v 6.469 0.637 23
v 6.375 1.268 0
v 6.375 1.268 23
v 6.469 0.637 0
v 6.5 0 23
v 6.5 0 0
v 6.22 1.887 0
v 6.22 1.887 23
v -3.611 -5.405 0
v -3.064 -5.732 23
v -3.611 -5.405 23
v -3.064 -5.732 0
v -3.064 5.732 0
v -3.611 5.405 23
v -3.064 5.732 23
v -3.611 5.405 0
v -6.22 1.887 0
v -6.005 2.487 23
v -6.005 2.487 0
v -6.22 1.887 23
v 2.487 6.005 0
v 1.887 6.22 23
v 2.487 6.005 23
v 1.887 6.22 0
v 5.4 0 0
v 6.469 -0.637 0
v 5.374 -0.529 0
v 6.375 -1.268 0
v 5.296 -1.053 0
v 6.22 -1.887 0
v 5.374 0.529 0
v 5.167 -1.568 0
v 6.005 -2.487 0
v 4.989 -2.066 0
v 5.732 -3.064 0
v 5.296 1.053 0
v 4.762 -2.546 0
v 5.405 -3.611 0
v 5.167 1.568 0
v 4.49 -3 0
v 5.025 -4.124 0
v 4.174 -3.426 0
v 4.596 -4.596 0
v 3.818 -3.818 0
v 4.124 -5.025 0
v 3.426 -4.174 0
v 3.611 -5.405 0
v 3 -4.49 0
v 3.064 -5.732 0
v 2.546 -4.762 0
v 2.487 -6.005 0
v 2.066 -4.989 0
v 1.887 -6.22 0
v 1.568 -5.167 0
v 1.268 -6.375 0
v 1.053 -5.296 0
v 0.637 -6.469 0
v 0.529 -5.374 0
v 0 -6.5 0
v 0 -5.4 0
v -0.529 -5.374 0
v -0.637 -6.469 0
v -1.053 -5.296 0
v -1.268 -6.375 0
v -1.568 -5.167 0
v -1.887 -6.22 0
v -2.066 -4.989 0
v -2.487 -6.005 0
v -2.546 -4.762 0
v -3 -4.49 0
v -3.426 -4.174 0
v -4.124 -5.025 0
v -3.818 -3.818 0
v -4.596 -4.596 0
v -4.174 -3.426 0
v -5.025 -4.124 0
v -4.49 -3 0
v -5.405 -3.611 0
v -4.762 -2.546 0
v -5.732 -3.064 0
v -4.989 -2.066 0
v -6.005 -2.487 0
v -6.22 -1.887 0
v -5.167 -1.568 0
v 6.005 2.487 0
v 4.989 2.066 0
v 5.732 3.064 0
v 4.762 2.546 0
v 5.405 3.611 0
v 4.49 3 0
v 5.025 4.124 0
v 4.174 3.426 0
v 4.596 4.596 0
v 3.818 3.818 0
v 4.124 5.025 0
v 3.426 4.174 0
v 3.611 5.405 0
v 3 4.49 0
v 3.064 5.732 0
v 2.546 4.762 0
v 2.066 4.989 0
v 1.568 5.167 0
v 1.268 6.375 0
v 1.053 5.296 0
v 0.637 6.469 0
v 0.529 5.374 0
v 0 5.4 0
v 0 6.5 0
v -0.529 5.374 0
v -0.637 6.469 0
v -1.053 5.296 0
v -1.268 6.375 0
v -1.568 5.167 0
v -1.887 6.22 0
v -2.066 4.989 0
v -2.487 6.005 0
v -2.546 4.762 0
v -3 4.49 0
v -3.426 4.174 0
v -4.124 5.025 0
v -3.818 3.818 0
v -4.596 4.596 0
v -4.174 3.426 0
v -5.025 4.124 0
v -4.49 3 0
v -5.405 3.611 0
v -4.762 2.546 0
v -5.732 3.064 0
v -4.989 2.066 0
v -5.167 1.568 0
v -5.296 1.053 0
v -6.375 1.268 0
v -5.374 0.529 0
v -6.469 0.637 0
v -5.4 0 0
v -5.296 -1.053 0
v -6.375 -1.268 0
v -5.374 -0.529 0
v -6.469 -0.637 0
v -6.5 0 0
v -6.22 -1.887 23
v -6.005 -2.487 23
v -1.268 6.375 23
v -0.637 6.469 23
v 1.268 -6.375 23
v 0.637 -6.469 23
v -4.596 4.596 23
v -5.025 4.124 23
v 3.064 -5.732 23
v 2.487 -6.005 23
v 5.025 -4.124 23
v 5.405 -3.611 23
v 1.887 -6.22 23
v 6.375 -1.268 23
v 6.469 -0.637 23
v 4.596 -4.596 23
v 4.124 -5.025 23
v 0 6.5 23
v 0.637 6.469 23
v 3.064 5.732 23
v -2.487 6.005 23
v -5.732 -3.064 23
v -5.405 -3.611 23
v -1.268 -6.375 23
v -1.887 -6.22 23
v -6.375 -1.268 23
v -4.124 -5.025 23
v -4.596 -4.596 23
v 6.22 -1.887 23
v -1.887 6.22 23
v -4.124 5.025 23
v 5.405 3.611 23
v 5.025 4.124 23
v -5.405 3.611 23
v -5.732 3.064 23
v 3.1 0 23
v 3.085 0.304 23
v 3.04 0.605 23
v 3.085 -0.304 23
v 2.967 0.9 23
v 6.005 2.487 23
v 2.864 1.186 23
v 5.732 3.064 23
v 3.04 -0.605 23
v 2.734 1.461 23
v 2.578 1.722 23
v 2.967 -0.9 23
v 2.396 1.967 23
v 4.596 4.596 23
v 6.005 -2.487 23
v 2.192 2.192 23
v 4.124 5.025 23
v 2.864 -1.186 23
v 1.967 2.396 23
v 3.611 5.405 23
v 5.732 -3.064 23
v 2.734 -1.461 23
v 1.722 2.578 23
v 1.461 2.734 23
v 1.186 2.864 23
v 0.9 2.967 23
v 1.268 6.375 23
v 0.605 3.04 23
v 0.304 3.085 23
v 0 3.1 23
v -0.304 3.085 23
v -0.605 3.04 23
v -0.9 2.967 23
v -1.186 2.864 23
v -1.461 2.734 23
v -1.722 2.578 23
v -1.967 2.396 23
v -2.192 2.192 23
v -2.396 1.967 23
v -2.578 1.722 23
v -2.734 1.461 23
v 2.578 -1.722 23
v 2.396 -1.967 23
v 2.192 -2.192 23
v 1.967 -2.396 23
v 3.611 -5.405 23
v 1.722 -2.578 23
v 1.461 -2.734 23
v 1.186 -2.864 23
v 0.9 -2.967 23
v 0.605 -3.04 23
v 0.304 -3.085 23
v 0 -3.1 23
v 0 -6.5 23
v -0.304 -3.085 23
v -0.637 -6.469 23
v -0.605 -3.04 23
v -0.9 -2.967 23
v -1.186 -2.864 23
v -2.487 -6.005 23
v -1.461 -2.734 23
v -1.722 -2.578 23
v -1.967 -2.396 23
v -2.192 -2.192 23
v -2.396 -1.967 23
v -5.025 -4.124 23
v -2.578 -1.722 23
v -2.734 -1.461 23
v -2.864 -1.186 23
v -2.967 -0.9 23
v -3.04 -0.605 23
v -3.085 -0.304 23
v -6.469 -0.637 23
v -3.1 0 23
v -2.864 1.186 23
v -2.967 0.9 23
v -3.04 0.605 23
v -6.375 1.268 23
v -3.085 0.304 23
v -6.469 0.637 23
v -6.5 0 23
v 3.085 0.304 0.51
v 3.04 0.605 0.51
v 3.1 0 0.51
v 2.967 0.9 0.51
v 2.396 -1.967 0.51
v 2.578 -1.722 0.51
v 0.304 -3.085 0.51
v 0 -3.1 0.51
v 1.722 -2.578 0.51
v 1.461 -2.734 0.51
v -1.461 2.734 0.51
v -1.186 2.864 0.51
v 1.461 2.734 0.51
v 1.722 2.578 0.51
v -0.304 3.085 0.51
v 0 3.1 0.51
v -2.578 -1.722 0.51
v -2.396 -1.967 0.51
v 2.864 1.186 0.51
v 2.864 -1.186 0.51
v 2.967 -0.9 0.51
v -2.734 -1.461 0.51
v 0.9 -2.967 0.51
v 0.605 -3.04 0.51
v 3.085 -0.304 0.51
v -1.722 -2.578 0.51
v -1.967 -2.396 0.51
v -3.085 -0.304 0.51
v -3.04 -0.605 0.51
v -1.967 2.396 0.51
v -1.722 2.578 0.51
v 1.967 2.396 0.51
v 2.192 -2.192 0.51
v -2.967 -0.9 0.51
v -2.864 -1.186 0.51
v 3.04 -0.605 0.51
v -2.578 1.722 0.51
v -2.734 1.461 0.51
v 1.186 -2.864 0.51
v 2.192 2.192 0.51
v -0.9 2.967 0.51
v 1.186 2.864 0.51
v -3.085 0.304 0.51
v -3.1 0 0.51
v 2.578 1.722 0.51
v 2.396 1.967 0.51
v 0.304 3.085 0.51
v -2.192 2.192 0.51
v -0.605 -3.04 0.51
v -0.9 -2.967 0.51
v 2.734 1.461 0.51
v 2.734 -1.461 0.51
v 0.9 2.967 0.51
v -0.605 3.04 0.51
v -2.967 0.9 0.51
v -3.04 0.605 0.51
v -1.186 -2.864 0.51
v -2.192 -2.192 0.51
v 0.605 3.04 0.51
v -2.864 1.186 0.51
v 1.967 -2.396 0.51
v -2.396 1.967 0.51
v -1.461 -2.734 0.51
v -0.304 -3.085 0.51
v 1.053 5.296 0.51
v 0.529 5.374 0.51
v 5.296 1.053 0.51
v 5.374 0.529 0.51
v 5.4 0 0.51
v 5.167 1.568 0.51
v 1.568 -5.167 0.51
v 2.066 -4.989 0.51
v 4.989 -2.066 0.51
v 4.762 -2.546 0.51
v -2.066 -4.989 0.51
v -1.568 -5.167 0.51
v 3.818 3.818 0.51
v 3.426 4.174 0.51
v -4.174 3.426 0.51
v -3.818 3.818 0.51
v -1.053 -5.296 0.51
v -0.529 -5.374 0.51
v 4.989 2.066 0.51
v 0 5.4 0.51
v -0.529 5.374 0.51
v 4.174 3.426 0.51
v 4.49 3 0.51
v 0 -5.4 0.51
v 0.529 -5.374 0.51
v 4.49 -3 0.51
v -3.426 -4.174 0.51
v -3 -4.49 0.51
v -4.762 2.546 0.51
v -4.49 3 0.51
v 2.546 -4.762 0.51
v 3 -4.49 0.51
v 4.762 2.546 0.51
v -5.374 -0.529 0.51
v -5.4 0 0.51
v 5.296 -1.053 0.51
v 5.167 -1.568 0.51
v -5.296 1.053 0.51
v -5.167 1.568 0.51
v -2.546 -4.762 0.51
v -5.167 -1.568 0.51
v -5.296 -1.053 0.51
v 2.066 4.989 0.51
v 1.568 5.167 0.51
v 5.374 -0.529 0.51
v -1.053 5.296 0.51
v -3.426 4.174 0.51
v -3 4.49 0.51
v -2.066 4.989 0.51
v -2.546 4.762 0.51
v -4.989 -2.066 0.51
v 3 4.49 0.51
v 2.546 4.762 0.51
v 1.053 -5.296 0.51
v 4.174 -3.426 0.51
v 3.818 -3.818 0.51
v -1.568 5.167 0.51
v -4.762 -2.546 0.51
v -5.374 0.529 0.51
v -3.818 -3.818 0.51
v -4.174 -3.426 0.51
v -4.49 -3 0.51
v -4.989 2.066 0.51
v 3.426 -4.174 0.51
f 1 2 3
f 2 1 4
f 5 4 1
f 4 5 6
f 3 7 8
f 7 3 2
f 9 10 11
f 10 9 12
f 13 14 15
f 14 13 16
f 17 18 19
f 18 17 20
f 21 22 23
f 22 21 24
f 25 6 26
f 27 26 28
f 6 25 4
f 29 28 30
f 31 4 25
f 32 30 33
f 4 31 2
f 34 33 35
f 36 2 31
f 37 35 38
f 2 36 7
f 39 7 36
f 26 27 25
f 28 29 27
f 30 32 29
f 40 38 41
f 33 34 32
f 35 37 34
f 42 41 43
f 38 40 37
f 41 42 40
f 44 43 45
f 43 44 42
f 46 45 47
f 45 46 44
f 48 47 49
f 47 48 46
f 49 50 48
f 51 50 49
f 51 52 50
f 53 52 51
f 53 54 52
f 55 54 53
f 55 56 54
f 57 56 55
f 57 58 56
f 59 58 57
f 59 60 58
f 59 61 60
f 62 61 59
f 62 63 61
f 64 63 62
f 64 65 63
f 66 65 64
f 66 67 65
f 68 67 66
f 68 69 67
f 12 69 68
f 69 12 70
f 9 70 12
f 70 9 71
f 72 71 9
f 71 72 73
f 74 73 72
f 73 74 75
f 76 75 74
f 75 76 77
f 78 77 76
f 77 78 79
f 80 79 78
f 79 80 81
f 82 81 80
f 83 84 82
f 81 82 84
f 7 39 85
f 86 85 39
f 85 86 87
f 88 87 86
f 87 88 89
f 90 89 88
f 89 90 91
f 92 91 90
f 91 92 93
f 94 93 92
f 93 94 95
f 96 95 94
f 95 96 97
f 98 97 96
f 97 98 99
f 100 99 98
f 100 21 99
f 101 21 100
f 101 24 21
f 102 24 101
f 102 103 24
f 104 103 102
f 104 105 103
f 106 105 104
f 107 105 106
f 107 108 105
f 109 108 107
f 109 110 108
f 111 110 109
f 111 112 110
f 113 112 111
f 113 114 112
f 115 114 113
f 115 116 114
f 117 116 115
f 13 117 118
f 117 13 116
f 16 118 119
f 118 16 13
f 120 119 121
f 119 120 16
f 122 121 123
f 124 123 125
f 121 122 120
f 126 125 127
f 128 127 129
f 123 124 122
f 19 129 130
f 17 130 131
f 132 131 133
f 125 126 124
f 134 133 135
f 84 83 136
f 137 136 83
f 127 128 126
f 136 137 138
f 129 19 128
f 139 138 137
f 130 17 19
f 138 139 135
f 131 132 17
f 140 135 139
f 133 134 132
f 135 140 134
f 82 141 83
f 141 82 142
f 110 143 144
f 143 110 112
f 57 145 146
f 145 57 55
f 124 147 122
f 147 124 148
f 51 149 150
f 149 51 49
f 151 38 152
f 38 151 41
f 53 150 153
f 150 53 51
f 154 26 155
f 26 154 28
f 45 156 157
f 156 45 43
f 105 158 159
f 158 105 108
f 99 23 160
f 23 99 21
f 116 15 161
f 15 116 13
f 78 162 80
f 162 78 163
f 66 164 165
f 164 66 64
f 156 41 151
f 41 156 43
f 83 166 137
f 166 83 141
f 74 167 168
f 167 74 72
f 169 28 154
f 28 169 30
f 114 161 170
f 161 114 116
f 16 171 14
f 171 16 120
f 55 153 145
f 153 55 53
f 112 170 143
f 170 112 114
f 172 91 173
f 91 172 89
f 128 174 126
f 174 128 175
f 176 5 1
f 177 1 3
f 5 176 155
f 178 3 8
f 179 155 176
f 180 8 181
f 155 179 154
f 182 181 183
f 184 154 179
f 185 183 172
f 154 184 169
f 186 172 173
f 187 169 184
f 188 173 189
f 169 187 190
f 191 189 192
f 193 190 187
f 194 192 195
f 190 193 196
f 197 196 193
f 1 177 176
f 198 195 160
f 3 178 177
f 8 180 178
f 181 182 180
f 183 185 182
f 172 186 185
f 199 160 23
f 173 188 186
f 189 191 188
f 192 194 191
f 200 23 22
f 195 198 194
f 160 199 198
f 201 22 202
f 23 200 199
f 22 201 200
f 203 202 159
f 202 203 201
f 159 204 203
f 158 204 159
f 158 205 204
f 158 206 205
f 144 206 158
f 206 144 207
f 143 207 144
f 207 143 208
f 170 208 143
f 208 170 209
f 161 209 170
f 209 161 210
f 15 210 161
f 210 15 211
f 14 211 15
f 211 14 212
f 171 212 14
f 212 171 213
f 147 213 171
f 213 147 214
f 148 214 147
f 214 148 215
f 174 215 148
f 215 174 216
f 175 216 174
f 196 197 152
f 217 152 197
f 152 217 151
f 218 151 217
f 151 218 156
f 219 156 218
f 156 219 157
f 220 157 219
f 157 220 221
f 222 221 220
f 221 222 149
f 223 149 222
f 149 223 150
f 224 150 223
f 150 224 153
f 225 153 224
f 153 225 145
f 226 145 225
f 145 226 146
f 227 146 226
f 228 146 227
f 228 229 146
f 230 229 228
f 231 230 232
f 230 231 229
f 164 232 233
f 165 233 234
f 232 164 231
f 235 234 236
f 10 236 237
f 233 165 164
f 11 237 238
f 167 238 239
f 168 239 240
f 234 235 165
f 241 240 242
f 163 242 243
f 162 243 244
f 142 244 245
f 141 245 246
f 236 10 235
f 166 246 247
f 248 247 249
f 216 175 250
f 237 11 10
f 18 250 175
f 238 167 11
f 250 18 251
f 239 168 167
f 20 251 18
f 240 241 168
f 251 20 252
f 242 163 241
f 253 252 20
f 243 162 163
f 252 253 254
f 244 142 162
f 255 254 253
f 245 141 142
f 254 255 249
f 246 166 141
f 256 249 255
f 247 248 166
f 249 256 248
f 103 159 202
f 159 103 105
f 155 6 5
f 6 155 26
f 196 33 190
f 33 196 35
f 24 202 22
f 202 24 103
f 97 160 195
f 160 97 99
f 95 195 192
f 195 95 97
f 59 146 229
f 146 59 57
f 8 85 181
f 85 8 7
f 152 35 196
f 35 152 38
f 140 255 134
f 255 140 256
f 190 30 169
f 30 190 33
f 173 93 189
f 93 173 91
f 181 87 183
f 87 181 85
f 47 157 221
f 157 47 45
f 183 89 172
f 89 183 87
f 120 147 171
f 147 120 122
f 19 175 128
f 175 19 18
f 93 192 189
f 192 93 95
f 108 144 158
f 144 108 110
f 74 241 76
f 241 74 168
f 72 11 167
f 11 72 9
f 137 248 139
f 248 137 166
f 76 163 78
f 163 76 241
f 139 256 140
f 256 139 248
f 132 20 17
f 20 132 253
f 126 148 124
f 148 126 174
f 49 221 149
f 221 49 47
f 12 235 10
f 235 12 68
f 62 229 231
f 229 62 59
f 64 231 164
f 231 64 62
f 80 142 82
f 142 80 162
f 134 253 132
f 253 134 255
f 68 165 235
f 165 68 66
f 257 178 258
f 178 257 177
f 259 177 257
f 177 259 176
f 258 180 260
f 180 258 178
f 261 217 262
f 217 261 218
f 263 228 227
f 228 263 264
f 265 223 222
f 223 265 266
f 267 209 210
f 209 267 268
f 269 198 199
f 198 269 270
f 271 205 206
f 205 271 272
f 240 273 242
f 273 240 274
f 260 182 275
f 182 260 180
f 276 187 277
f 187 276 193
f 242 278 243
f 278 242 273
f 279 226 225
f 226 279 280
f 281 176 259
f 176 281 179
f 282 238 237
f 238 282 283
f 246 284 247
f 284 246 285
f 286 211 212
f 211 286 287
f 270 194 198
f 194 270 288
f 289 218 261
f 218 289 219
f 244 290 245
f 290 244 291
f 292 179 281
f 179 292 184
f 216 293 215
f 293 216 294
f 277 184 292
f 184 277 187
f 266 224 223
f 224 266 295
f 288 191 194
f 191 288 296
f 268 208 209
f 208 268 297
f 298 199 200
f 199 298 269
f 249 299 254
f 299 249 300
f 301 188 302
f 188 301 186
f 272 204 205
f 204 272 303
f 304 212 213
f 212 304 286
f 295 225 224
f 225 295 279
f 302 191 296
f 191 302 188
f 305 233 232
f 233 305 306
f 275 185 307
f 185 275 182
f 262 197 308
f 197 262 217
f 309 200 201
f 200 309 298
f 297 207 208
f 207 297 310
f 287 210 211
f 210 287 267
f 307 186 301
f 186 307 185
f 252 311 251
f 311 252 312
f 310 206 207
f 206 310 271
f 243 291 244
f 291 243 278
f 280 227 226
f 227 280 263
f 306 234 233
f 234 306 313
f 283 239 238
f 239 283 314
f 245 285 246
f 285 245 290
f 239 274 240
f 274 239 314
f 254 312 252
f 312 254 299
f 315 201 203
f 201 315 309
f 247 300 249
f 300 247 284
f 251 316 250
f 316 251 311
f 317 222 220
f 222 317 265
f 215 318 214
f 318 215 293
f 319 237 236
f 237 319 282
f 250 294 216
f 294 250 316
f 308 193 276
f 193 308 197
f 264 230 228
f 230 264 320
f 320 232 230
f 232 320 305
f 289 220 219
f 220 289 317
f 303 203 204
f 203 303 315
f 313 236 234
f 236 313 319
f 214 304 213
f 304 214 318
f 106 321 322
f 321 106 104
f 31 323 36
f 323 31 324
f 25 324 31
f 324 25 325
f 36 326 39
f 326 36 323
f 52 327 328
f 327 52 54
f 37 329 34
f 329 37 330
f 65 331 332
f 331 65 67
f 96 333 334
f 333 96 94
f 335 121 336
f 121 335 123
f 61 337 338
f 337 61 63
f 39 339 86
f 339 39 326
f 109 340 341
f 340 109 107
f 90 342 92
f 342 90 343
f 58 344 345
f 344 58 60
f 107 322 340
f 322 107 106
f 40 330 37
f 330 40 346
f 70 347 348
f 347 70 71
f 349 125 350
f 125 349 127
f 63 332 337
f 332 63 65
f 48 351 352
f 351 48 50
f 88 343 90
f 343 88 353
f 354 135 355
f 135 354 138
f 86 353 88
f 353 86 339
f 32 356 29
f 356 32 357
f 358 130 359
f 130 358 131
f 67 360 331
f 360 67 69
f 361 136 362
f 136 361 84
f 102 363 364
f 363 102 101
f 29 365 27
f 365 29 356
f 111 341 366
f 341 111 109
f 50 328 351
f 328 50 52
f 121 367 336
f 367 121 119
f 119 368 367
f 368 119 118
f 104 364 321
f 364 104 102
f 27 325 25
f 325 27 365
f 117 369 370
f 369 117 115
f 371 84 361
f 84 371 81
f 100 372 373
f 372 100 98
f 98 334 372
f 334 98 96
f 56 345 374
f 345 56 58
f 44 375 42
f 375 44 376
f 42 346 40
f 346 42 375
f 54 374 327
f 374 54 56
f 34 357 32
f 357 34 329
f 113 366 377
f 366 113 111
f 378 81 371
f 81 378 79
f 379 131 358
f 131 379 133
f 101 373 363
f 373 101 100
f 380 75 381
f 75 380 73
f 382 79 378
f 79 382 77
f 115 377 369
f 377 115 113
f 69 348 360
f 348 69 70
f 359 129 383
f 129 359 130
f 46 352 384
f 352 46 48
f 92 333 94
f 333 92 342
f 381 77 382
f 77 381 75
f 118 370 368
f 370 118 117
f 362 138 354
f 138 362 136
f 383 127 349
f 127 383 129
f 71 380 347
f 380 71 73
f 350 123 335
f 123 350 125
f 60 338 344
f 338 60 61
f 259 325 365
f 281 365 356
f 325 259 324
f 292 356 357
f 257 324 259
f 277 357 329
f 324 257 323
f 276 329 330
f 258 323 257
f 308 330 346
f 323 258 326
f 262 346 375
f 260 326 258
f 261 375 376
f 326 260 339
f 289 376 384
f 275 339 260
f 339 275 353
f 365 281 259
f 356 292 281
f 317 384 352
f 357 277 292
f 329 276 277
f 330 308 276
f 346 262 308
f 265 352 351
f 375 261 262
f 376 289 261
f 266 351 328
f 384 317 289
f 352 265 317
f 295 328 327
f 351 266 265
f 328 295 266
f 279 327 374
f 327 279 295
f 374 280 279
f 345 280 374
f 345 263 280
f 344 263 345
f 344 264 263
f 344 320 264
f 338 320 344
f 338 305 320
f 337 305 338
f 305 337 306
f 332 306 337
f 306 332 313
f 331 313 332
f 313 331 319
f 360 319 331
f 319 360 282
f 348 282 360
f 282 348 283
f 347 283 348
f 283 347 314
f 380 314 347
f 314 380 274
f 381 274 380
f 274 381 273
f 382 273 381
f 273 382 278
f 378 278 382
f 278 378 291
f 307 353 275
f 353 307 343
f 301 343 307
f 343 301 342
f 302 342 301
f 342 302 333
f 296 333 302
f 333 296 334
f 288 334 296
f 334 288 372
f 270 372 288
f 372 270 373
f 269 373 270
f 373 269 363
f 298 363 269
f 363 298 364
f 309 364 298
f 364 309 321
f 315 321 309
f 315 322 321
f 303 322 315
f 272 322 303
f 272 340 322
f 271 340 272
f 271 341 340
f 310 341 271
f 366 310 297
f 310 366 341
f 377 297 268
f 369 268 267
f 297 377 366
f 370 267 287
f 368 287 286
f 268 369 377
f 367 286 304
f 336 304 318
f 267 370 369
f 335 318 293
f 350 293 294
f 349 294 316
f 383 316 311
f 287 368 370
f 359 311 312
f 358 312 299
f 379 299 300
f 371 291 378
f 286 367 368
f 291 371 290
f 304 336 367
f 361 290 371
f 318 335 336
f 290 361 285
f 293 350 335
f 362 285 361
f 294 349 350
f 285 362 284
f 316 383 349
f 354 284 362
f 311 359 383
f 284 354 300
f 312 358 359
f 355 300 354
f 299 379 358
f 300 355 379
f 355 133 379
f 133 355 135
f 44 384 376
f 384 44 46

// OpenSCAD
// PCR Tube Adapter Sleeve - fits 0.2mL tubes into 1.5mL rack holes.
// Print orientation: Collar on bed (z=0 to 1.5), body rises to z=21.5.

// Dimensions
collar_od = 13;
collar_t  = 1.5;
body_od   = 10.8;
body_h    = 21.5;
bore_d    = 6.2;

$fn = 64;

// Total height calculation
total_h = collar_t + body_h;

difference() {
    // Main body: Cylinder from z=0 to z=total_h
    translate([0, 0, 0]) 
        cylinder(h = total_h, d = collar_od);
    
    // Cut out the bore through the entire height
    translate([0, 0, -1]) 
        cylinder(h = total_h + 2, d = bore_d);
    
    // Cut out the collar area to create the step down to the body OD
    // The collar sits on the bed, so we cut a cylinder from z=0 to z=collar_t
    // with diameter = body_od. We extend slightly past the collar top.
    translate([0, 0, -1]) 
        cylinder(h = collar_t + 0.01, d = body_od);
}
